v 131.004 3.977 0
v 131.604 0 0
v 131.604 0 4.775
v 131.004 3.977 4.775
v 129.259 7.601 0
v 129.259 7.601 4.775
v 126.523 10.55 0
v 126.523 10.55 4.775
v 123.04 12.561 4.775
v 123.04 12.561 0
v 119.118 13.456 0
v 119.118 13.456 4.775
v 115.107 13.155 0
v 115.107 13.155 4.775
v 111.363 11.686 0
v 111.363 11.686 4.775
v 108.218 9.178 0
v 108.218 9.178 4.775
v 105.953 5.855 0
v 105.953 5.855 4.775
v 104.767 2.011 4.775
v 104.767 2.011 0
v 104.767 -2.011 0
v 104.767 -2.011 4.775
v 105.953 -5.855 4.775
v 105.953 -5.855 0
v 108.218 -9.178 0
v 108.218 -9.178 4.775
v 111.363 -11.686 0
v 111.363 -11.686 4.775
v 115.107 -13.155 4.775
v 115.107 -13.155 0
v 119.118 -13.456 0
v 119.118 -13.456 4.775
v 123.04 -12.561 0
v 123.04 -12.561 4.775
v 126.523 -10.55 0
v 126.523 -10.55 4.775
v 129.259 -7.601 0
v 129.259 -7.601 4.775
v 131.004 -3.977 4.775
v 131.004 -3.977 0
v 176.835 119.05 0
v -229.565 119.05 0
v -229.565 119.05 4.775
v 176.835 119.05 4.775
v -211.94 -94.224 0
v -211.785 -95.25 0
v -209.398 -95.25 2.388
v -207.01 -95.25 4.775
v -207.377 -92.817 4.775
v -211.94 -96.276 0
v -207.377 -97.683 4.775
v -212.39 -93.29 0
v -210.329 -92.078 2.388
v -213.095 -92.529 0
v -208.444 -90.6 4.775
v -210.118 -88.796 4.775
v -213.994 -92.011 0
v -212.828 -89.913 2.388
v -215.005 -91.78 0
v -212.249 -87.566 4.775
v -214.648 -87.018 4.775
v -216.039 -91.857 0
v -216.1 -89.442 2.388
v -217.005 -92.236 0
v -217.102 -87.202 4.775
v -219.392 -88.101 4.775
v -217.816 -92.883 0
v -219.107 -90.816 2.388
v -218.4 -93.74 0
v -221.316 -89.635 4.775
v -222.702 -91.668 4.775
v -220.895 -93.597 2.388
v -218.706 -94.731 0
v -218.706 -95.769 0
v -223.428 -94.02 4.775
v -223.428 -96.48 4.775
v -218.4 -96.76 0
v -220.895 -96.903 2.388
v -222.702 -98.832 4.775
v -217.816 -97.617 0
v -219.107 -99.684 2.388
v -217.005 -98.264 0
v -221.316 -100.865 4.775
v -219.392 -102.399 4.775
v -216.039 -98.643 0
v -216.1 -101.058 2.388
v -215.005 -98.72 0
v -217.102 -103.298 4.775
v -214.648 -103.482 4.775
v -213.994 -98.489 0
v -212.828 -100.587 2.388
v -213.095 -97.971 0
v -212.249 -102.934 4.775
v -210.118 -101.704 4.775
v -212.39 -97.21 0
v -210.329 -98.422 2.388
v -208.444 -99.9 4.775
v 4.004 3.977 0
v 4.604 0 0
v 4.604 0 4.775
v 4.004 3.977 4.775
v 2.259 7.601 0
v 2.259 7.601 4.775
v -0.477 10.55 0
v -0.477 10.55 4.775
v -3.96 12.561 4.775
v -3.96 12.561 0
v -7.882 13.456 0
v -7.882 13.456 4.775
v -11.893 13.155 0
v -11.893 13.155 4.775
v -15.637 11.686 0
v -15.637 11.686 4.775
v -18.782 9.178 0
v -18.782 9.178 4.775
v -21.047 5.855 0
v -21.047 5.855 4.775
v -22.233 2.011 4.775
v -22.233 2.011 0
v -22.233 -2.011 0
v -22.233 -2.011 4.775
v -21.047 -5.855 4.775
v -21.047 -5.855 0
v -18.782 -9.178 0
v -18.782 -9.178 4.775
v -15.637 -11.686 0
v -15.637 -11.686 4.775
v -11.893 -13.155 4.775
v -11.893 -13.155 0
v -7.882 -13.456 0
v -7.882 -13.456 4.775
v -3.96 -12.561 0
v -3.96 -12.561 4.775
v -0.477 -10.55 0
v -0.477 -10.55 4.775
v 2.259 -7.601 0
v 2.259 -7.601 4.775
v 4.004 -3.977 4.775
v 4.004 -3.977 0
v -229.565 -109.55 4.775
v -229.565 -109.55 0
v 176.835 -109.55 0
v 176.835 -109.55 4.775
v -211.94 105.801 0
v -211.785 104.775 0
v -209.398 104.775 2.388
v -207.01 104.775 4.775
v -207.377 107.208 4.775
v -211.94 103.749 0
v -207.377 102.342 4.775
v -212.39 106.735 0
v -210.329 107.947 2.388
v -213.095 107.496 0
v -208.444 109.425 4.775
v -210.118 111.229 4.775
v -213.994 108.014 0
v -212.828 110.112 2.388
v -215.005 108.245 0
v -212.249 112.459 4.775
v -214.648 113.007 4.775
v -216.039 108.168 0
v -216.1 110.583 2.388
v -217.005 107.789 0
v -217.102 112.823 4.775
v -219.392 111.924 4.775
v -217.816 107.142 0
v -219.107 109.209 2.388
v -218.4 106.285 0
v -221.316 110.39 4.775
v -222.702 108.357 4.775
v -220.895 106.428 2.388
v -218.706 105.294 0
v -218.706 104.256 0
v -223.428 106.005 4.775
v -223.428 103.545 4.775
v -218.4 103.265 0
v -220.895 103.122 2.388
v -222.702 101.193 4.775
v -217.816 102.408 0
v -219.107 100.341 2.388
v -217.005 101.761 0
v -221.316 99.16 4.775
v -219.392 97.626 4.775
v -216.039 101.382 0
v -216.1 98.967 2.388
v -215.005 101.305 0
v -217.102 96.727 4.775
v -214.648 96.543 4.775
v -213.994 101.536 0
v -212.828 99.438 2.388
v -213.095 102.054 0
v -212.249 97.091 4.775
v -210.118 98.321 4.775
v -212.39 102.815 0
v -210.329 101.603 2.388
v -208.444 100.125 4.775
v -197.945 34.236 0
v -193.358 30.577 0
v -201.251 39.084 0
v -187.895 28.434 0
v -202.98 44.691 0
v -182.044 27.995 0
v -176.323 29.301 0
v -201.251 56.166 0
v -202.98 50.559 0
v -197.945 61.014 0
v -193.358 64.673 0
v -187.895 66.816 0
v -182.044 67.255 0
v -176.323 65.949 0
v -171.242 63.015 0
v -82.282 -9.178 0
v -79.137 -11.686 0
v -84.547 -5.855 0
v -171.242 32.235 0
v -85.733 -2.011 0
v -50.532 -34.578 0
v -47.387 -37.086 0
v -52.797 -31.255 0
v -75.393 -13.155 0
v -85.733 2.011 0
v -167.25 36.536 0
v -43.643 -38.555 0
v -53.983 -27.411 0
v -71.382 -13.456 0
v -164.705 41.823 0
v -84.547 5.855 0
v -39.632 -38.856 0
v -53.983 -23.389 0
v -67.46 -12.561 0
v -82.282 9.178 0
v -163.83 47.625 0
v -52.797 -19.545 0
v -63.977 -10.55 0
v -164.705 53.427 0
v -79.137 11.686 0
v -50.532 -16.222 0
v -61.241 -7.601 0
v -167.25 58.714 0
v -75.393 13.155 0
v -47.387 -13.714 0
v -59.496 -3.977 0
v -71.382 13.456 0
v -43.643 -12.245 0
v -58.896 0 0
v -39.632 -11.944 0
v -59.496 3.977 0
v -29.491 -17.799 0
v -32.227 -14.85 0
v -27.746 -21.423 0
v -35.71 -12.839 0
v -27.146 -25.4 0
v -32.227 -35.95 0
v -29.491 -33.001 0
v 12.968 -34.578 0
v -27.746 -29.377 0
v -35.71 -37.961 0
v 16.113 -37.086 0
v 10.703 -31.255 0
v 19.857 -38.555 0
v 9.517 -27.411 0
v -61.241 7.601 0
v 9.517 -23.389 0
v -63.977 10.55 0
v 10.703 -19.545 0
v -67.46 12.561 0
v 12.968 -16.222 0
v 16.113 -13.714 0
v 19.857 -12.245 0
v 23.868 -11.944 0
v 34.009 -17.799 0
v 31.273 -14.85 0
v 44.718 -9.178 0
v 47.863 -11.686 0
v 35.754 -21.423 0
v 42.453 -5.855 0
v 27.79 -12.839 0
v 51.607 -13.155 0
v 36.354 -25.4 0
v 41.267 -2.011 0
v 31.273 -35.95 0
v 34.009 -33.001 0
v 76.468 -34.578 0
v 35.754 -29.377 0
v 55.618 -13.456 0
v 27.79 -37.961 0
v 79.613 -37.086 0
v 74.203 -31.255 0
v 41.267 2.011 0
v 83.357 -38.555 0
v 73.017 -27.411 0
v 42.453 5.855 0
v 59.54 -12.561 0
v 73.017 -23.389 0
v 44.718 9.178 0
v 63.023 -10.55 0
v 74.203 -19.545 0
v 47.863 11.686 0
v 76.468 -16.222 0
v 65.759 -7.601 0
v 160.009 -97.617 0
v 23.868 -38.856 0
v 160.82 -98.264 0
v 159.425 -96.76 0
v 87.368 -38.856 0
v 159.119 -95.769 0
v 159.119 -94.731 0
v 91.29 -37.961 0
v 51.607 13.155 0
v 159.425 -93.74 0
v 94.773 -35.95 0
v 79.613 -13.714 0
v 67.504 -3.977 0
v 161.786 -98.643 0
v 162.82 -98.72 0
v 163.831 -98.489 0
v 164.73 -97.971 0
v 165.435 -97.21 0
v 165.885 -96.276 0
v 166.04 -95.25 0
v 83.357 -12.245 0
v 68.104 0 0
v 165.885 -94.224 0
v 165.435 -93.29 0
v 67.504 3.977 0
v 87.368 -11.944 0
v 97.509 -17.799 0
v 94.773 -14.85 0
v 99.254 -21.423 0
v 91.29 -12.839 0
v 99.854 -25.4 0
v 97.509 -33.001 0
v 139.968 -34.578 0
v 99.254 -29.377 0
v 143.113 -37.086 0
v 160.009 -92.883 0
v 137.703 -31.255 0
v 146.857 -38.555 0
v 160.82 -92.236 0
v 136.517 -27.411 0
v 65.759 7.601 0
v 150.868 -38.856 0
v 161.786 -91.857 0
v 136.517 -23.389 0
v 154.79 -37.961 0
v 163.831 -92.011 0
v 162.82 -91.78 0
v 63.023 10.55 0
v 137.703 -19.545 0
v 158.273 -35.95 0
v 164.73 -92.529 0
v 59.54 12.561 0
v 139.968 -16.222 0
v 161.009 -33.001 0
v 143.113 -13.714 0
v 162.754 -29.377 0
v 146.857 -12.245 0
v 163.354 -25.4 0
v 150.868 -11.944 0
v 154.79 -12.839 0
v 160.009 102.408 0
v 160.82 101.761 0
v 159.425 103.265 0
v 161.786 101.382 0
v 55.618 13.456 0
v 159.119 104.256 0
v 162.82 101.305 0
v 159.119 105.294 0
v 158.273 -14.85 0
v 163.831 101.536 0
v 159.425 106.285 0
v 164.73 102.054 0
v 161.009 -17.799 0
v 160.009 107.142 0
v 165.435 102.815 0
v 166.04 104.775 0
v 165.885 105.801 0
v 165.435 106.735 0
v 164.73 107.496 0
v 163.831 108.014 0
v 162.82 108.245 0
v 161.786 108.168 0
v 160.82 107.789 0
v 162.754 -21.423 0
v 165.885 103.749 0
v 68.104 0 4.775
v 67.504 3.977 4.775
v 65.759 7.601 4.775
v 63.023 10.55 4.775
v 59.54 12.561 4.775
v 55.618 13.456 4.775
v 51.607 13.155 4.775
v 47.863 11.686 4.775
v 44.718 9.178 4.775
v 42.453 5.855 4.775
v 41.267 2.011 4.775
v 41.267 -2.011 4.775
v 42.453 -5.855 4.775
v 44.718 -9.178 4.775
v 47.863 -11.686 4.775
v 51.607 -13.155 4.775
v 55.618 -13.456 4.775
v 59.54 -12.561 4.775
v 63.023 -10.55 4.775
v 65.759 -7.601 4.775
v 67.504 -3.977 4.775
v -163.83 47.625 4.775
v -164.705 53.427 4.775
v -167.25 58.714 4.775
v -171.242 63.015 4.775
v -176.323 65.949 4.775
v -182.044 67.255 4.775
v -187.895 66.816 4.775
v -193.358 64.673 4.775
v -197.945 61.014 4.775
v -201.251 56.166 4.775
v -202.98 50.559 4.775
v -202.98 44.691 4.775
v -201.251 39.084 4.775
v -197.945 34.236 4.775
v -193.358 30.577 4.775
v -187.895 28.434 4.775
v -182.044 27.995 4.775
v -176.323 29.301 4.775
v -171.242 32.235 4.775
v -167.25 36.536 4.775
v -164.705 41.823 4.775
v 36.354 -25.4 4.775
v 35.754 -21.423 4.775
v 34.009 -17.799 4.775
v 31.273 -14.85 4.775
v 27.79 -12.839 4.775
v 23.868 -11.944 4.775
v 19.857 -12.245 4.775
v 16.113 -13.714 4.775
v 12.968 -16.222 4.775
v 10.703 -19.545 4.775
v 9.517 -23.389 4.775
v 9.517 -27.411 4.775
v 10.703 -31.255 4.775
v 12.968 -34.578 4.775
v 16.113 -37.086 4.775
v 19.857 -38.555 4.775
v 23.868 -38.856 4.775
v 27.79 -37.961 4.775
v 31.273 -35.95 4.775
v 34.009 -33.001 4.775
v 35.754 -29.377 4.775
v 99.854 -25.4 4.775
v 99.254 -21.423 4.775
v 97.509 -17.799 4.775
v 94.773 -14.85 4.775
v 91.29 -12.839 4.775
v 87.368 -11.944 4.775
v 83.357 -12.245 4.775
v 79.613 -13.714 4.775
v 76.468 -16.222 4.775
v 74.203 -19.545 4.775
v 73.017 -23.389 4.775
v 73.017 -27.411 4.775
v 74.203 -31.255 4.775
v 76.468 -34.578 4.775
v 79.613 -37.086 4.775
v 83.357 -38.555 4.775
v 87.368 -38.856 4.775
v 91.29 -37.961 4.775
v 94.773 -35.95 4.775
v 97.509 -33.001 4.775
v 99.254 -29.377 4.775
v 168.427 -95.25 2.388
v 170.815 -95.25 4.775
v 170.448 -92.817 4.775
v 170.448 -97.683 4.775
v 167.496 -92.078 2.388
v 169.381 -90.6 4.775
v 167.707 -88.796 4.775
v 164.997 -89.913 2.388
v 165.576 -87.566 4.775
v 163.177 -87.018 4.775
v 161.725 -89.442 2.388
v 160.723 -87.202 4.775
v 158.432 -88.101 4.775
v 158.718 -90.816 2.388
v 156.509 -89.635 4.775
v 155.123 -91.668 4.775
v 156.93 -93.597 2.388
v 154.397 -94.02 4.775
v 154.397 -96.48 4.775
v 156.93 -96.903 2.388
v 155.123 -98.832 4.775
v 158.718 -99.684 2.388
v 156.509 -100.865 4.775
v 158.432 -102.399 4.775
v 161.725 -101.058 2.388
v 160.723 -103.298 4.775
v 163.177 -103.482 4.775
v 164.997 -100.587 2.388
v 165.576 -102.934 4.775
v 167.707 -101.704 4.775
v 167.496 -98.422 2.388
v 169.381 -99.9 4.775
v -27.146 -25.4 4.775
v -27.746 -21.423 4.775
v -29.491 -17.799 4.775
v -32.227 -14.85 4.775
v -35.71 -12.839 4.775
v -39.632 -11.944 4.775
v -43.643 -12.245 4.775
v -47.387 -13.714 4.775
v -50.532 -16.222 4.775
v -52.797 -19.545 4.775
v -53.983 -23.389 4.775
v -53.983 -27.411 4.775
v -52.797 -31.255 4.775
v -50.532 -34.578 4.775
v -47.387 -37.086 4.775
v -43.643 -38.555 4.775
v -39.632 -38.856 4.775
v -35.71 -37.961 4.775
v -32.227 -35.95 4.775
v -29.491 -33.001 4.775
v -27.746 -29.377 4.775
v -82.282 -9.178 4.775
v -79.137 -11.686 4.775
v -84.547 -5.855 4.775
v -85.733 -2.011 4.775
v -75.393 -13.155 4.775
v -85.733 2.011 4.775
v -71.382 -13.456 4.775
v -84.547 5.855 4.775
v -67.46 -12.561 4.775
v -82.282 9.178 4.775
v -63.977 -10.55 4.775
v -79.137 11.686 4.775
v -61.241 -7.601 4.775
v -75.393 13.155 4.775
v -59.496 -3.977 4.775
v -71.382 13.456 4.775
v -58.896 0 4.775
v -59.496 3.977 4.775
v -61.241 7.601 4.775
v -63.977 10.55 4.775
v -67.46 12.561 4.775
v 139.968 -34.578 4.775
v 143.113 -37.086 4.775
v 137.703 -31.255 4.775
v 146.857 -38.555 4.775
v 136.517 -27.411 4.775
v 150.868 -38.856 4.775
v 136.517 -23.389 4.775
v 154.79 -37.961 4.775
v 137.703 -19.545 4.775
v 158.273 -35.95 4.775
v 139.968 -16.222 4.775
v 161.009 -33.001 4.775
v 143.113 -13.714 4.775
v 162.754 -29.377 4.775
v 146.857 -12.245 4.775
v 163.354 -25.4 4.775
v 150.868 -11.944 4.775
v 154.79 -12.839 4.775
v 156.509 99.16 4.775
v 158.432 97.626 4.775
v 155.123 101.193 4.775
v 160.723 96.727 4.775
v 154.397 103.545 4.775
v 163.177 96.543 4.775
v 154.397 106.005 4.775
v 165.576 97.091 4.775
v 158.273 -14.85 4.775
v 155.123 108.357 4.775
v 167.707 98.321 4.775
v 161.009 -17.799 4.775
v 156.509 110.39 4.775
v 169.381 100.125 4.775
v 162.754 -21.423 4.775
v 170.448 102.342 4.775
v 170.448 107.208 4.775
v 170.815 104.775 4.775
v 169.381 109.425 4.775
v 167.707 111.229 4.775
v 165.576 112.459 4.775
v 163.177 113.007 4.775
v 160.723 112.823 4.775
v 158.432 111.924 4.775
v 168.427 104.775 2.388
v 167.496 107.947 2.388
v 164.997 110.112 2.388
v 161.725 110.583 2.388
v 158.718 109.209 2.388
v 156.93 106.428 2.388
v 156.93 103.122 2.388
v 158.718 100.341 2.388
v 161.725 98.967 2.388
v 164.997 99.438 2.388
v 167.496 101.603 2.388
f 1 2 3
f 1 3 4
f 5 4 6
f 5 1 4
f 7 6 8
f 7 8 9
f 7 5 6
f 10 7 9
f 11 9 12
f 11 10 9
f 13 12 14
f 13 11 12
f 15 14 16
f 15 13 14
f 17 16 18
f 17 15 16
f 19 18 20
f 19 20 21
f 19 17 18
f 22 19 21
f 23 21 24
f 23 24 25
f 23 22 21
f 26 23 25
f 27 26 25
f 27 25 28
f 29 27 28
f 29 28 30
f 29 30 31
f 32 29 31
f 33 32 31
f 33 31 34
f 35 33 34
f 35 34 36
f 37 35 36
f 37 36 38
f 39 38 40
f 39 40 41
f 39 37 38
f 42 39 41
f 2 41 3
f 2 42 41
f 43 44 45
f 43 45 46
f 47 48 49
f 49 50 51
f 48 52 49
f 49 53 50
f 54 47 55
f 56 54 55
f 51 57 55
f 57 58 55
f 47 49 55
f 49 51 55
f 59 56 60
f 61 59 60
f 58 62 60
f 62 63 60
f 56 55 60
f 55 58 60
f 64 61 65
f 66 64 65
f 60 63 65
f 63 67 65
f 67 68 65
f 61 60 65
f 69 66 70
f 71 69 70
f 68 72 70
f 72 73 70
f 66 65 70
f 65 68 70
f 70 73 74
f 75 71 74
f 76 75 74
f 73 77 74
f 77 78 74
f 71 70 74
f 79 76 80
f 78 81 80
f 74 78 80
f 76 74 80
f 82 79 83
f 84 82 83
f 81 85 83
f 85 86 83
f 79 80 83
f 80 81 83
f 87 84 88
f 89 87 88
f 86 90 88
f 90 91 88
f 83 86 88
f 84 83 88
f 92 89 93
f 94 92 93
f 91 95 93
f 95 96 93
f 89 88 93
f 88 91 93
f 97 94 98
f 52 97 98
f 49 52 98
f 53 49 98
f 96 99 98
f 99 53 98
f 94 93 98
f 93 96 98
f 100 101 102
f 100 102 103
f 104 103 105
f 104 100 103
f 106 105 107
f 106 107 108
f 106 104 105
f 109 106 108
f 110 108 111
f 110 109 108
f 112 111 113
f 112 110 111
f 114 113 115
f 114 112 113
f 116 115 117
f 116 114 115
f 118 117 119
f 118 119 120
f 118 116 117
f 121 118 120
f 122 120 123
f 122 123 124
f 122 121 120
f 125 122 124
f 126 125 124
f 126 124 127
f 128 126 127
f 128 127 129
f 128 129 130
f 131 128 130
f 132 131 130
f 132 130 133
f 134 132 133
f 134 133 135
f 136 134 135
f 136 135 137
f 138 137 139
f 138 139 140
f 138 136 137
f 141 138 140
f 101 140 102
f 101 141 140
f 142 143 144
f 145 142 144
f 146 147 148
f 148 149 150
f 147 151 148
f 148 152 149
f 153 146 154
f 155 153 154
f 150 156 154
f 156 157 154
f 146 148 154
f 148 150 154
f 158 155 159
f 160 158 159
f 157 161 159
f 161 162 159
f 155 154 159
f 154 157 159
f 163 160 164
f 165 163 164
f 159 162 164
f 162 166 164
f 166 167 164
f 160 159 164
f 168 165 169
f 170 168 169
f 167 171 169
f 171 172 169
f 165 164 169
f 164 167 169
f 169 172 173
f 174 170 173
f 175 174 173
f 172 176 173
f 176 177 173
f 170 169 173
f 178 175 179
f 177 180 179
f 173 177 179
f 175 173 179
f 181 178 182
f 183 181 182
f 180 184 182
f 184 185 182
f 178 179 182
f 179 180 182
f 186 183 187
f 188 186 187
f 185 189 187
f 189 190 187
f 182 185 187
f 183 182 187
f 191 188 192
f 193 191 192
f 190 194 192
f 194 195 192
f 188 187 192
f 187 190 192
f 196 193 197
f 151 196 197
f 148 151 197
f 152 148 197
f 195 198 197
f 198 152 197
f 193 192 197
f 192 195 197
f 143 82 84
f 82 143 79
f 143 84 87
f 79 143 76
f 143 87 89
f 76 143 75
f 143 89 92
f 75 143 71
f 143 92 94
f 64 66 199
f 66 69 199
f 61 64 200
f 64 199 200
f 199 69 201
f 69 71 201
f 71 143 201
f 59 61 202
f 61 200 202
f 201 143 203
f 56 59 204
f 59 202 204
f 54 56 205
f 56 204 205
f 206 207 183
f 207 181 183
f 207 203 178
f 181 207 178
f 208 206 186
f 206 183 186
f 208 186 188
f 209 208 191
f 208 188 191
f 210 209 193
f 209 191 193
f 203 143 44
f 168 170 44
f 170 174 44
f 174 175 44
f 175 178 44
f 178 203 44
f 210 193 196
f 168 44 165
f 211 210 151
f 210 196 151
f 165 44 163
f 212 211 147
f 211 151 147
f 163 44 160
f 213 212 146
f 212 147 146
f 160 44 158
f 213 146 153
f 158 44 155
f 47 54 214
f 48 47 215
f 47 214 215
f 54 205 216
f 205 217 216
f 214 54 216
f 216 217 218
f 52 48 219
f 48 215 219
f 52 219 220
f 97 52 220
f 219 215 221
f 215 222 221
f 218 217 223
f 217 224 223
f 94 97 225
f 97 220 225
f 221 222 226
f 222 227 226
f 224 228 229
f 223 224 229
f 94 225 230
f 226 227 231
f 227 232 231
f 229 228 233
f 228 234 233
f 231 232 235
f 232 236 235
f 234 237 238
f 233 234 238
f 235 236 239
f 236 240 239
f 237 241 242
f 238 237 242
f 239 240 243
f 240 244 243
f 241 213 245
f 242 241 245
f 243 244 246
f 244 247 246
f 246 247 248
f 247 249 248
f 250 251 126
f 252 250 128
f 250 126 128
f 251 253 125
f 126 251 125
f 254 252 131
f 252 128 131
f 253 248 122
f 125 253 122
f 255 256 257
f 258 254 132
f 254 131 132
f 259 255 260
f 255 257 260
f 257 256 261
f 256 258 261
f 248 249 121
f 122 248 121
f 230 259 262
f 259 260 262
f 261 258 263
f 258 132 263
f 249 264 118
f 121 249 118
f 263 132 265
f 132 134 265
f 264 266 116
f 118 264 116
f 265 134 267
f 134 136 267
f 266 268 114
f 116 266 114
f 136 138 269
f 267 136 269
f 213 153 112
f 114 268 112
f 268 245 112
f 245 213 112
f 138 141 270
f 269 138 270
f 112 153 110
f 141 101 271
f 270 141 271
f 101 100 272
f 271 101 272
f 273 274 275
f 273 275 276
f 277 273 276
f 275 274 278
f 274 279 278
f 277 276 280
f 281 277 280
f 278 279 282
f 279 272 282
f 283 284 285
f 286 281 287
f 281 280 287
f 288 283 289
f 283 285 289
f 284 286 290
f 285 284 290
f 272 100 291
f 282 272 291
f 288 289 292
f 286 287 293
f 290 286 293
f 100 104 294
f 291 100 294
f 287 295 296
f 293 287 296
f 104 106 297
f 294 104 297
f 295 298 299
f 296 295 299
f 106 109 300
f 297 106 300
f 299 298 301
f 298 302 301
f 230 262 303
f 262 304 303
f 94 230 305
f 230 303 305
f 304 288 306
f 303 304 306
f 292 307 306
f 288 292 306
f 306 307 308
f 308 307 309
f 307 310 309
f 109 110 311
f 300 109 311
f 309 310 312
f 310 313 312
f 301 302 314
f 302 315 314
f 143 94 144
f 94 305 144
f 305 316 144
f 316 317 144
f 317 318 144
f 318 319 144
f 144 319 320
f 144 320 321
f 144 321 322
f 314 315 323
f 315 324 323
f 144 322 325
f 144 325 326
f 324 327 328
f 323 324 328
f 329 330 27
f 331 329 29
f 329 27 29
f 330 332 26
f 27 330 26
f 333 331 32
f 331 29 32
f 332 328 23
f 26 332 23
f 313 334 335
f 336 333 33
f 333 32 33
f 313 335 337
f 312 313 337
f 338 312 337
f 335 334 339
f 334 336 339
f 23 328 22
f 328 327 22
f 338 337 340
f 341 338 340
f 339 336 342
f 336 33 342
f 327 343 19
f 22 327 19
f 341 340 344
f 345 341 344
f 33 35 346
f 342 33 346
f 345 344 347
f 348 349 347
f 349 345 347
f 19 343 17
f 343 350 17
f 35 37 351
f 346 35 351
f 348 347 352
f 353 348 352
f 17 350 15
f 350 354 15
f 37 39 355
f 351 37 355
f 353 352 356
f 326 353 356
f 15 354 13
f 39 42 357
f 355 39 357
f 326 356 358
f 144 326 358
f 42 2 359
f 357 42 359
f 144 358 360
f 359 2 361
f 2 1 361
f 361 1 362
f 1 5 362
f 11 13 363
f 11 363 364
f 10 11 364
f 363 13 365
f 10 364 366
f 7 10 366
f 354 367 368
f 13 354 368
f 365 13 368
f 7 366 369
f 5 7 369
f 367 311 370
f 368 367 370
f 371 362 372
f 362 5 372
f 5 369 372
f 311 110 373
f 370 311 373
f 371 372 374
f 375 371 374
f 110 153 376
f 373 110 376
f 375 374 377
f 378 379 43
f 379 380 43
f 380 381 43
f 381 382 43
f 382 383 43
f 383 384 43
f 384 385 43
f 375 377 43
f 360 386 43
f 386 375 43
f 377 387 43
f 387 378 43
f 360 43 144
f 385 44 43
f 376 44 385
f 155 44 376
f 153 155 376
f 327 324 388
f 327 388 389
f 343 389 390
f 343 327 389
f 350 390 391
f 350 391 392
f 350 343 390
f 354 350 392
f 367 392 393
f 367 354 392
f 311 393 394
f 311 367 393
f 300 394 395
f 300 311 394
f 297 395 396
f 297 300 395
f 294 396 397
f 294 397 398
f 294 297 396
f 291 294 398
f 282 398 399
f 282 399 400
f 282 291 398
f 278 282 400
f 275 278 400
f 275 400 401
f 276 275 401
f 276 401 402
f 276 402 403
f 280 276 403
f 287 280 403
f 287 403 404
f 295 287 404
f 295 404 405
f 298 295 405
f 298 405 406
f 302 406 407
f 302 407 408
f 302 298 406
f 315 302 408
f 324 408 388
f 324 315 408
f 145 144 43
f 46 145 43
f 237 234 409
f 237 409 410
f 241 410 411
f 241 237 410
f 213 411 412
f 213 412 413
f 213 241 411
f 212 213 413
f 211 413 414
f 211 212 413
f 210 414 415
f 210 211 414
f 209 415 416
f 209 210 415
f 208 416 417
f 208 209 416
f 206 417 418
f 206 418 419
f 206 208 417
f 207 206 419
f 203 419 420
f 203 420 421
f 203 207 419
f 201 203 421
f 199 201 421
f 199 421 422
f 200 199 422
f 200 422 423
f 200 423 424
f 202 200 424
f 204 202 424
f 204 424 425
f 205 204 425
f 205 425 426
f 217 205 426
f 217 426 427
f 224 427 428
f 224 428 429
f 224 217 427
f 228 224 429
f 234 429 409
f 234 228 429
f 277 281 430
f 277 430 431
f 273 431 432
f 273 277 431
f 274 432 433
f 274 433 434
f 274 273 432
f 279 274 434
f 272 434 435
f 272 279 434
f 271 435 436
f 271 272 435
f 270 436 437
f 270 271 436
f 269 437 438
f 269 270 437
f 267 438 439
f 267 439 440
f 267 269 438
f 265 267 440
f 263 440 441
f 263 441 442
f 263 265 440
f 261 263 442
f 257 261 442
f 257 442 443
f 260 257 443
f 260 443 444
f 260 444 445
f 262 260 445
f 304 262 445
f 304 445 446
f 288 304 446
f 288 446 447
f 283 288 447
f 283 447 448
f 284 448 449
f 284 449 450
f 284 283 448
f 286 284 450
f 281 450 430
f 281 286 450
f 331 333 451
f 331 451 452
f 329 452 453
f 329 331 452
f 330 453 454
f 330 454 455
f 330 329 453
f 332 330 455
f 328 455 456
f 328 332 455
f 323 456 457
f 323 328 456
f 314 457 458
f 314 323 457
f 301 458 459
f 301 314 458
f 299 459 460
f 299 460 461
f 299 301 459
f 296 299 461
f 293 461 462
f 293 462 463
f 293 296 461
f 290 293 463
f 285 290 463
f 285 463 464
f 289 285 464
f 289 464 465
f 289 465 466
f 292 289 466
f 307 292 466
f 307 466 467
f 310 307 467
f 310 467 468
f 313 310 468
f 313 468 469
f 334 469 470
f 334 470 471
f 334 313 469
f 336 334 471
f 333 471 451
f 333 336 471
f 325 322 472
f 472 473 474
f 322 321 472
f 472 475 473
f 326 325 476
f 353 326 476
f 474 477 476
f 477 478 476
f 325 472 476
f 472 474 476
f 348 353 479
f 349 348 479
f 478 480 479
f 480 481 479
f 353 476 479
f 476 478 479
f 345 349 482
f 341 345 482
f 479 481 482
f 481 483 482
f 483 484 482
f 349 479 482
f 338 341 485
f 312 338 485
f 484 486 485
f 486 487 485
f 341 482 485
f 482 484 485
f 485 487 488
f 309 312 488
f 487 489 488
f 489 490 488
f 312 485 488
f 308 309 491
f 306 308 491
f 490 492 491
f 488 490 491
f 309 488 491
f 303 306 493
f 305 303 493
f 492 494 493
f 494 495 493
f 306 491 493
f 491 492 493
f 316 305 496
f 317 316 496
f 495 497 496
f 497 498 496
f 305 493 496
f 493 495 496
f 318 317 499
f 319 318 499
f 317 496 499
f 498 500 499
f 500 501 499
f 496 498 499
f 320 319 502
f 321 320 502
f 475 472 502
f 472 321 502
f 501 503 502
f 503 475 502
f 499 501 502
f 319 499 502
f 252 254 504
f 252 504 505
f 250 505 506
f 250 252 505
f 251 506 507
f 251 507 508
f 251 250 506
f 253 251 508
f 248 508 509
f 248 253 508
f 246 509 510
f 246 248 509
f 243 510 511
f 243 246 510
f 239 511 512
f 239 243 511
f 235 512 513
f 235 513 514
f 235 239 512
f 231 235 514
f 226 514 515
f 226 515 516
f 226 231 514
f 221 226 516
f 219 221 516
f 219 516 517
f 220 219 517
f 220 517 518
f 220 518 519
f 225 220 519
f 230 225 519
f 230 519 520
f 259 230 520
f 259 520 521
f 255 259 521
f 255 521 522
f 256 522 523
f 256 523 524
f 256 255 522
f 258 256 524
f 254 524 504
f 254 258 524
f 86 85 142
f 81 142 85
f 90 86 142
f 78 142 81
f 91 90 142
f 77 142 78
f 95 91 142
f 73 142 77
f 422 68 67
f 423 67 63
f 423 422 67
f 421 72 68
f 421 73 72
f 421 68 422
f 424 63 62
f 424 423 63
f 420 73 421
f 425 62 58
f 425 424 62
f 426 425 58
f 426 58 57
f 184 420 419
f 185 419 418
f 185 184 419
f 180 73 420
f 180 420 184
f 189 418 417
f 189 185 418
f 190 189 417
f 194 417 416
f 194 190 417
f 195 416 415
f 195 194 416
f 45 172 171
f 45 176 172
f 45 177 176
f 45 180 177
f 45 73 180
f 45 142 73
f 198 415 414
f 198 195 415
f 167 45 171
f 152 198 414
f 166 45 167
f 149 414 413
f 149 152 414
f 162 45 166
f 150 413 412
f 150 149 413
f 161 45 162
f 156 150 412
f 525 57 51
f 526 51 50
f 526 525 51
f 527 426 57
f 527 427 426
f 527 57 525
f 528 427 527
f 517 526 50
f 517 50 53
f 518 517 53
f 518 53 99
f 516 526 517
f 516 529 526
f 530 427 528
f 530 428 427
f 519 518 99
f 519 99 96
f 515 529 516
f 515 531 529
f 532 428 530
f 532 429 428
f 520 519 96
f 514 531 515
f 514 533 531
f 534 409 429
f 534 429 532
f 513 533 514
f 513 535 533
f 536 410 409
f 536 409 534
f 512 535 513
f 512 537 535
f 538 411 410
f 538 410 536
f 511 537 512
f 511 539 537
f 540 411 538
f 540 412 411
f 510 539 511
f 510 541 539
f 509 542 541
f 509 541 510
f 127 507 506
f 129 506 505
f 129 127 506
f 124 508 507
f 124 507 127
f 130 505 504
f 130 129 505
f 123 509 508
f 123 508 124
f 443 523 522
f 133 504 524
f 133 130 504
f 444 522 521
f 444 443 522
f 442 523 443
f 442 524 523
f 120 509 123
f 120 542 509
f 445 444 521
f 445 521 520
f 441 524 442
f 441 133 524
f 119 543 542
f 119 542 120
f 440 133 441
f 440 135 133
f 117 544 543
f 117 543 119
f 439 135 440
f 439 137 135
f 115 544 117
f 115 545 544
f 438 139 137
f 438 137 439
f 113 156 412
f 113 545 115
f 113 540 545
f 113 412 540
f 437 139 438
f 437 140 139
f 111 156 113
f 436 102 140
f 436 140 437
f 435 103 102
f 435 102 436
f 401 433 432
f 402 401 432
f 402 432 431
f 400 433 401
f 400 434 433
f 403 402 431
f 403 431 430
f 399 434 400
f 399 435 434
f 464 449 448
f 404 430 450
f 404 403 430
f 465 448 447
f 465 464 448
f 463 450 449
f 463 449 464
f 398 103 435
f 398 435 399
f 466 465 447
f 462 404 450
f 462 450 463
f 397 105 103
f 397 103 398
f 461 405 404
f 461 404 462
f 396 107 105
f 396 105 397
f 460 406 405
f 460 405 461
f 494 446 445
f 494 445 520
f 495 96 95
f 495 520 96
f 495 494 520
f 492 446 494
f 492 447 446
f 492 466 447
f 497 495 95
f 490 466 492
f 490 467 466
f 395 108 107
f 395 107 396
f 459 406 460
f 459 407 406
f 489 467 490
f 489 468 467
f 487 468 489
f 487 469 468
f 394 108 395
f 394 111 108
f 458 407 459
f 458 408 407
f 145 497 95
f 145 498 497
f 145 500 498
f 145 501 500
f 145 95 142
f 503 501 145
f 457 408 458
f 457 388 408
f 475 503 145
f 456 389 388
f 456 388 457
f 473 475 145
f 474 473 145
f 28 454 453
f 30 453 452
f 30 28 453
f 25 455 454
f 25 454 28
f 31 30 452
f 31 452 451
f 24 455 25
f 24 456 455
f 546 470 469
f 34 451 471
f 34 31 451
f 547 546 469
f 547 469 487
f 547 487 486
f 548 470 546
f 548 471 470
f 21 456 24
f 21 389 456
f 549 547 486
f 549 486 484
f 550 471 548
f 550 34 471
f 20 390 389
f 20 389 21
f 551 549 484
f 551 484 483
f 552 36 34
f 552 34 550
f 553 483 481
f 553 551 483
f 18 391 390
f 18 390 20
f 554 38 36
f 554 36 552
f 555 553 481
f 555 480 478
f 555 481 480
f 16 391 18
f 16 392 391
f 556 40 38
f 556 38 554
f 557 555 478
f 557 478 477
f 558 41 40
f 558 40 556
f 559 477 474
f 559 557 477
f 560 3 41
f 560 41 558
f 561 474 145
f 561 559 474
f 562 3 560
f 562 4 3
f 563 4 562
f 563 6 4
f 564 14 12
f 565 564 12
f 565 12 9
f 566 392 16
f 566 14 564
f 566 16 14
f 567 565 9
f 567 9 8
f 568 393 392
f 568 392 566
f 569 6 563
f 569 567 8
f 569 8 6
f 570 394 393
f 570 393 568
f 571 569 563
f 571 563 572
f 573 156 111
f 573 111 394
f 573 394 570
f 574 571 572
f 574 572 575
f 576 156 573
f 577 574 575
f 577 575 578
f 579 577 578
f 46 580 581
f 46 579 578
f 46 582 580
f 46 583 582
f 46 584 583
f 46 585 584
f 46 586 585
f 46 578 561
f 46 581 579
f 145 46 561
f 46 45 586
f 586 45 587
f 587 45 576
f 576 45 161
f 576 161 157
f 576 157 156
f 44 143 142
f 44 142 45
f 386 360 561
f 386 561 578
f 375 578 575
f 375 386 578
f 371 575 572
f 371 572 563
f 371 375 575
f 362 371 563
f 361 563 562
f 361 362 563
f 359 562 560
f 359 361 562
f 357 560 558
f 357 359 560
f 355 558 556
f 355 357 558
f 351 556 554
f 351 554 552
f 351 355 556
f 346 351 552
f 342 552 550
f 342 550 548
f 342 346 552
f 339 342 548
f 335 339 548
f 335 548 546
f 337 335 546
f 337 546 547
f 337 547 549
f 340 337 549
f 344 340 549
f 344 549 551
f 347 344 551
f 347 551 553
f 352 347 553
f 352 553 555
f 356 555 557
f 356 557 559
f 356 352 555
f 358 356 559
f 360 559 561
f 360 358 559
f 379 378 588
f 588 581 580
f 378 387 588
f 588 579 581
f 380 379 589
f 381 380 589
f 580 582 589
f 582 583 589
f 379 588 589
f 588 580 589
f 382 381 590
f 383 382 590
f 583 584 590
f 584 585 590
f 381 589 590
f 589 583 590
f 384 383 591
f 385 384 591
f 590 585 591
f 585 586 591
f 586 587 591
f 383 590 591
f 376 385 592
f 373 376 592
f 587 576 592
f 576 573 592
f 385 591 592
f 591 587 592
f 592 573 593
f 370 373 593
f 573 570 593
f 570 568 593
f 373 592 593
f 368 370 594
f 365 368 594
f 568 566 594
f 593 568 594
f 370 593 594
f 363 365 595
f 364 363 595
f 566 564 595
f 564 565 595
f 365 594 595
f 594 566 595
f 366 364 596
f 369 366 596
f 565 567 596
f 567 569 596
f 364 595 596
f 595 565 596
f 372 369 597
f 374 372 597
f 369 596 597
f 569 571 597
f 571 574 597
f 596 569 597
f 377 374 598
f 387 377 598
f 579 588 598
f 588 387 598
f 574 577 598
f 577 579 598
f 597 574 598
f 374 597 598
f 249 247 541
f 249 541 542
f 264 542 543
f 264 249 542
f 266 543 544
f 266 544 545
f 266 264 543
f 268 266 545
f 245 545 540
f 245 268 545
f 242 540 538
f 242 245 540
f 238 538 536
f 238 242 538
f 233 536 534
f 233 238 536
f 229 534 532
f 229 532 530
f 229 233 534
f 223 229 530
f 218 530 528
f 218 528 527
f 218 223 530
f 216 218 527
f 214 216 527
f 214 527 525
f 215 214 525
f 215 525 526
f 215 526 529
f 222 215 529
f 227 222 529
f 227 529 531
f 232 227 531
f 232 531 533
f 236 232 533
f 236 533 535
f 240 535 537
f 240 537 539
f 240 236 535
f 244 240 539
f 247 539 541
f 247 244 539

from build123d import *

# Parameters (mm, degrees)
F0_W     = 406.4
F0_H     = 228.6
F0_W_2   = 396.875
F0_H_2   = 219.075
F0_R     = 3.175
F0_R_2   = 13.49375
F0_R_3   = 19.685
F1_DEPTH = 4.7752


# Not quite as in the source:
# - a fillet or chamfer that OpenCascade refuses, or shapes differently, is made with other operations: its cross-section is extruded or revolved along the edge and cut away or added


with BuildPart() as f1:
    # F0 (on Top) → F1 (new body)
    with BuildSketch(Plane.XY):
        with Locations((-26.3652, 4.7498)):
            Rectangle(F0_W, F0_H)
        with Locations((-26.3525, 4.7625)):
            Rectangle(F0_W_2, F0_H_2, mode=Mode.SUBTRACT)
        with Locations((-26.3525, 4.7625)):
            Rectangle(F0_W_2, F0_H_2)
        with Locations((-215.265, -95.25)):
            Circle(F0_R, mode=Mode.SUBTRACT)
        with Locations((-40.64, -25.4)):
            Circle(F0_R_2, mode=Mode.SUBTRACT)
        with Locations((-72.39, 0)):
            Circle(F0_R_2, mode=Mode.SUBTRACT)
        with Locations((162.56, -95.25)):
            Circle(F0_R, mode=Mode.SUBTRACT)
        with Locations((22.86, -25.4)):
            Circle(F0_R_2, mode=Mode.SUBTRACT)
        with Locations((-8.89, 0)):
            Circle(F0_R_2, mode=Mode.SUBTRACT)
        with Locations((54.61, 0)):
            Circle(F0_R_2, mode=Mode.SUBTRACT)
        with Locations((86.36, -25.4)):
            Circle(F0_R_2, mode=Mode.SUBTRACT)
        with Locations((149.86, -25.4)):
            Circle(F0_R_2, mode=Mode.SUBTRACT)
        with Locations((118.11, 0)):
            Circle(F0_R_2, mode=Mode.SUBTRACT)
        with Locations((-183.515, 47.625)):
            Circle(F0_R_3, mode=Mode.SUBTRACT)
        with Locations((-215.265, 104.775)):
            Circle(F0_R, mode=Mode.SUBTRACT)
        with Locations((162.56, 104.775)):
            Circle(F0_R, mode=Mode.SUBTRACT)
    extrude(amount=F1_DEPTH)

    # F2: chamfer of 5.08 on 4 edges, made by hand

    # F2_s1 → F2_t2 (revolve, cut)
    with BuildSketch(Plane.XZ.offset(95.25)):
        Polygon((-212.09, -0.3048), (-207.01, 4.7752), (-212.09, 4.7752), align=None)
    revolve(axis=Axis((-215.265, -95.25, 4.7752), (0, 0, 1)), mode=Mode.SUBTRACT)

    # F2_s3 → F2_t4 (revolve, cut)
    with BuildSketch(Plane.XZ.offset(-104.775)):
        Polygon((-212.09, -0.3048), (-207.01, 4.7752), (-212.09, 4.7752), align=None)
    revolve(axis=Axis((-215.265, 104.775, 4.7752), (0, 0, 1)), mode=Mode.SUBTRACT)

    # F2_s5 → F2_t6 (revolve, cut)
    with BuildSketch(Plane.XZ.offset(-104.775)):
        Polygon((165.735, -0.3048), (170.815, 4.7752), (165.735, 4.7752), align=None)
    revolve(axis=Axis((162.56, 104.775, 4.7752), (0, 0, 1)), mode=Mode.SUBTRACT)

    # F2_s7 → F2_t8 (revolve, cut)
    with BuildSketch(Plane.XZ.offset(95.25)):
        Polygon((165.735, -0.3048), (170.815, 4.7752), (165.735, 4.7752), align=None)
    revolve(axis=Axis((162.56, -95.25, 4.7752), (0, 0, 1)), mode=Mode.SUBTRACT)


solid = f1.part
